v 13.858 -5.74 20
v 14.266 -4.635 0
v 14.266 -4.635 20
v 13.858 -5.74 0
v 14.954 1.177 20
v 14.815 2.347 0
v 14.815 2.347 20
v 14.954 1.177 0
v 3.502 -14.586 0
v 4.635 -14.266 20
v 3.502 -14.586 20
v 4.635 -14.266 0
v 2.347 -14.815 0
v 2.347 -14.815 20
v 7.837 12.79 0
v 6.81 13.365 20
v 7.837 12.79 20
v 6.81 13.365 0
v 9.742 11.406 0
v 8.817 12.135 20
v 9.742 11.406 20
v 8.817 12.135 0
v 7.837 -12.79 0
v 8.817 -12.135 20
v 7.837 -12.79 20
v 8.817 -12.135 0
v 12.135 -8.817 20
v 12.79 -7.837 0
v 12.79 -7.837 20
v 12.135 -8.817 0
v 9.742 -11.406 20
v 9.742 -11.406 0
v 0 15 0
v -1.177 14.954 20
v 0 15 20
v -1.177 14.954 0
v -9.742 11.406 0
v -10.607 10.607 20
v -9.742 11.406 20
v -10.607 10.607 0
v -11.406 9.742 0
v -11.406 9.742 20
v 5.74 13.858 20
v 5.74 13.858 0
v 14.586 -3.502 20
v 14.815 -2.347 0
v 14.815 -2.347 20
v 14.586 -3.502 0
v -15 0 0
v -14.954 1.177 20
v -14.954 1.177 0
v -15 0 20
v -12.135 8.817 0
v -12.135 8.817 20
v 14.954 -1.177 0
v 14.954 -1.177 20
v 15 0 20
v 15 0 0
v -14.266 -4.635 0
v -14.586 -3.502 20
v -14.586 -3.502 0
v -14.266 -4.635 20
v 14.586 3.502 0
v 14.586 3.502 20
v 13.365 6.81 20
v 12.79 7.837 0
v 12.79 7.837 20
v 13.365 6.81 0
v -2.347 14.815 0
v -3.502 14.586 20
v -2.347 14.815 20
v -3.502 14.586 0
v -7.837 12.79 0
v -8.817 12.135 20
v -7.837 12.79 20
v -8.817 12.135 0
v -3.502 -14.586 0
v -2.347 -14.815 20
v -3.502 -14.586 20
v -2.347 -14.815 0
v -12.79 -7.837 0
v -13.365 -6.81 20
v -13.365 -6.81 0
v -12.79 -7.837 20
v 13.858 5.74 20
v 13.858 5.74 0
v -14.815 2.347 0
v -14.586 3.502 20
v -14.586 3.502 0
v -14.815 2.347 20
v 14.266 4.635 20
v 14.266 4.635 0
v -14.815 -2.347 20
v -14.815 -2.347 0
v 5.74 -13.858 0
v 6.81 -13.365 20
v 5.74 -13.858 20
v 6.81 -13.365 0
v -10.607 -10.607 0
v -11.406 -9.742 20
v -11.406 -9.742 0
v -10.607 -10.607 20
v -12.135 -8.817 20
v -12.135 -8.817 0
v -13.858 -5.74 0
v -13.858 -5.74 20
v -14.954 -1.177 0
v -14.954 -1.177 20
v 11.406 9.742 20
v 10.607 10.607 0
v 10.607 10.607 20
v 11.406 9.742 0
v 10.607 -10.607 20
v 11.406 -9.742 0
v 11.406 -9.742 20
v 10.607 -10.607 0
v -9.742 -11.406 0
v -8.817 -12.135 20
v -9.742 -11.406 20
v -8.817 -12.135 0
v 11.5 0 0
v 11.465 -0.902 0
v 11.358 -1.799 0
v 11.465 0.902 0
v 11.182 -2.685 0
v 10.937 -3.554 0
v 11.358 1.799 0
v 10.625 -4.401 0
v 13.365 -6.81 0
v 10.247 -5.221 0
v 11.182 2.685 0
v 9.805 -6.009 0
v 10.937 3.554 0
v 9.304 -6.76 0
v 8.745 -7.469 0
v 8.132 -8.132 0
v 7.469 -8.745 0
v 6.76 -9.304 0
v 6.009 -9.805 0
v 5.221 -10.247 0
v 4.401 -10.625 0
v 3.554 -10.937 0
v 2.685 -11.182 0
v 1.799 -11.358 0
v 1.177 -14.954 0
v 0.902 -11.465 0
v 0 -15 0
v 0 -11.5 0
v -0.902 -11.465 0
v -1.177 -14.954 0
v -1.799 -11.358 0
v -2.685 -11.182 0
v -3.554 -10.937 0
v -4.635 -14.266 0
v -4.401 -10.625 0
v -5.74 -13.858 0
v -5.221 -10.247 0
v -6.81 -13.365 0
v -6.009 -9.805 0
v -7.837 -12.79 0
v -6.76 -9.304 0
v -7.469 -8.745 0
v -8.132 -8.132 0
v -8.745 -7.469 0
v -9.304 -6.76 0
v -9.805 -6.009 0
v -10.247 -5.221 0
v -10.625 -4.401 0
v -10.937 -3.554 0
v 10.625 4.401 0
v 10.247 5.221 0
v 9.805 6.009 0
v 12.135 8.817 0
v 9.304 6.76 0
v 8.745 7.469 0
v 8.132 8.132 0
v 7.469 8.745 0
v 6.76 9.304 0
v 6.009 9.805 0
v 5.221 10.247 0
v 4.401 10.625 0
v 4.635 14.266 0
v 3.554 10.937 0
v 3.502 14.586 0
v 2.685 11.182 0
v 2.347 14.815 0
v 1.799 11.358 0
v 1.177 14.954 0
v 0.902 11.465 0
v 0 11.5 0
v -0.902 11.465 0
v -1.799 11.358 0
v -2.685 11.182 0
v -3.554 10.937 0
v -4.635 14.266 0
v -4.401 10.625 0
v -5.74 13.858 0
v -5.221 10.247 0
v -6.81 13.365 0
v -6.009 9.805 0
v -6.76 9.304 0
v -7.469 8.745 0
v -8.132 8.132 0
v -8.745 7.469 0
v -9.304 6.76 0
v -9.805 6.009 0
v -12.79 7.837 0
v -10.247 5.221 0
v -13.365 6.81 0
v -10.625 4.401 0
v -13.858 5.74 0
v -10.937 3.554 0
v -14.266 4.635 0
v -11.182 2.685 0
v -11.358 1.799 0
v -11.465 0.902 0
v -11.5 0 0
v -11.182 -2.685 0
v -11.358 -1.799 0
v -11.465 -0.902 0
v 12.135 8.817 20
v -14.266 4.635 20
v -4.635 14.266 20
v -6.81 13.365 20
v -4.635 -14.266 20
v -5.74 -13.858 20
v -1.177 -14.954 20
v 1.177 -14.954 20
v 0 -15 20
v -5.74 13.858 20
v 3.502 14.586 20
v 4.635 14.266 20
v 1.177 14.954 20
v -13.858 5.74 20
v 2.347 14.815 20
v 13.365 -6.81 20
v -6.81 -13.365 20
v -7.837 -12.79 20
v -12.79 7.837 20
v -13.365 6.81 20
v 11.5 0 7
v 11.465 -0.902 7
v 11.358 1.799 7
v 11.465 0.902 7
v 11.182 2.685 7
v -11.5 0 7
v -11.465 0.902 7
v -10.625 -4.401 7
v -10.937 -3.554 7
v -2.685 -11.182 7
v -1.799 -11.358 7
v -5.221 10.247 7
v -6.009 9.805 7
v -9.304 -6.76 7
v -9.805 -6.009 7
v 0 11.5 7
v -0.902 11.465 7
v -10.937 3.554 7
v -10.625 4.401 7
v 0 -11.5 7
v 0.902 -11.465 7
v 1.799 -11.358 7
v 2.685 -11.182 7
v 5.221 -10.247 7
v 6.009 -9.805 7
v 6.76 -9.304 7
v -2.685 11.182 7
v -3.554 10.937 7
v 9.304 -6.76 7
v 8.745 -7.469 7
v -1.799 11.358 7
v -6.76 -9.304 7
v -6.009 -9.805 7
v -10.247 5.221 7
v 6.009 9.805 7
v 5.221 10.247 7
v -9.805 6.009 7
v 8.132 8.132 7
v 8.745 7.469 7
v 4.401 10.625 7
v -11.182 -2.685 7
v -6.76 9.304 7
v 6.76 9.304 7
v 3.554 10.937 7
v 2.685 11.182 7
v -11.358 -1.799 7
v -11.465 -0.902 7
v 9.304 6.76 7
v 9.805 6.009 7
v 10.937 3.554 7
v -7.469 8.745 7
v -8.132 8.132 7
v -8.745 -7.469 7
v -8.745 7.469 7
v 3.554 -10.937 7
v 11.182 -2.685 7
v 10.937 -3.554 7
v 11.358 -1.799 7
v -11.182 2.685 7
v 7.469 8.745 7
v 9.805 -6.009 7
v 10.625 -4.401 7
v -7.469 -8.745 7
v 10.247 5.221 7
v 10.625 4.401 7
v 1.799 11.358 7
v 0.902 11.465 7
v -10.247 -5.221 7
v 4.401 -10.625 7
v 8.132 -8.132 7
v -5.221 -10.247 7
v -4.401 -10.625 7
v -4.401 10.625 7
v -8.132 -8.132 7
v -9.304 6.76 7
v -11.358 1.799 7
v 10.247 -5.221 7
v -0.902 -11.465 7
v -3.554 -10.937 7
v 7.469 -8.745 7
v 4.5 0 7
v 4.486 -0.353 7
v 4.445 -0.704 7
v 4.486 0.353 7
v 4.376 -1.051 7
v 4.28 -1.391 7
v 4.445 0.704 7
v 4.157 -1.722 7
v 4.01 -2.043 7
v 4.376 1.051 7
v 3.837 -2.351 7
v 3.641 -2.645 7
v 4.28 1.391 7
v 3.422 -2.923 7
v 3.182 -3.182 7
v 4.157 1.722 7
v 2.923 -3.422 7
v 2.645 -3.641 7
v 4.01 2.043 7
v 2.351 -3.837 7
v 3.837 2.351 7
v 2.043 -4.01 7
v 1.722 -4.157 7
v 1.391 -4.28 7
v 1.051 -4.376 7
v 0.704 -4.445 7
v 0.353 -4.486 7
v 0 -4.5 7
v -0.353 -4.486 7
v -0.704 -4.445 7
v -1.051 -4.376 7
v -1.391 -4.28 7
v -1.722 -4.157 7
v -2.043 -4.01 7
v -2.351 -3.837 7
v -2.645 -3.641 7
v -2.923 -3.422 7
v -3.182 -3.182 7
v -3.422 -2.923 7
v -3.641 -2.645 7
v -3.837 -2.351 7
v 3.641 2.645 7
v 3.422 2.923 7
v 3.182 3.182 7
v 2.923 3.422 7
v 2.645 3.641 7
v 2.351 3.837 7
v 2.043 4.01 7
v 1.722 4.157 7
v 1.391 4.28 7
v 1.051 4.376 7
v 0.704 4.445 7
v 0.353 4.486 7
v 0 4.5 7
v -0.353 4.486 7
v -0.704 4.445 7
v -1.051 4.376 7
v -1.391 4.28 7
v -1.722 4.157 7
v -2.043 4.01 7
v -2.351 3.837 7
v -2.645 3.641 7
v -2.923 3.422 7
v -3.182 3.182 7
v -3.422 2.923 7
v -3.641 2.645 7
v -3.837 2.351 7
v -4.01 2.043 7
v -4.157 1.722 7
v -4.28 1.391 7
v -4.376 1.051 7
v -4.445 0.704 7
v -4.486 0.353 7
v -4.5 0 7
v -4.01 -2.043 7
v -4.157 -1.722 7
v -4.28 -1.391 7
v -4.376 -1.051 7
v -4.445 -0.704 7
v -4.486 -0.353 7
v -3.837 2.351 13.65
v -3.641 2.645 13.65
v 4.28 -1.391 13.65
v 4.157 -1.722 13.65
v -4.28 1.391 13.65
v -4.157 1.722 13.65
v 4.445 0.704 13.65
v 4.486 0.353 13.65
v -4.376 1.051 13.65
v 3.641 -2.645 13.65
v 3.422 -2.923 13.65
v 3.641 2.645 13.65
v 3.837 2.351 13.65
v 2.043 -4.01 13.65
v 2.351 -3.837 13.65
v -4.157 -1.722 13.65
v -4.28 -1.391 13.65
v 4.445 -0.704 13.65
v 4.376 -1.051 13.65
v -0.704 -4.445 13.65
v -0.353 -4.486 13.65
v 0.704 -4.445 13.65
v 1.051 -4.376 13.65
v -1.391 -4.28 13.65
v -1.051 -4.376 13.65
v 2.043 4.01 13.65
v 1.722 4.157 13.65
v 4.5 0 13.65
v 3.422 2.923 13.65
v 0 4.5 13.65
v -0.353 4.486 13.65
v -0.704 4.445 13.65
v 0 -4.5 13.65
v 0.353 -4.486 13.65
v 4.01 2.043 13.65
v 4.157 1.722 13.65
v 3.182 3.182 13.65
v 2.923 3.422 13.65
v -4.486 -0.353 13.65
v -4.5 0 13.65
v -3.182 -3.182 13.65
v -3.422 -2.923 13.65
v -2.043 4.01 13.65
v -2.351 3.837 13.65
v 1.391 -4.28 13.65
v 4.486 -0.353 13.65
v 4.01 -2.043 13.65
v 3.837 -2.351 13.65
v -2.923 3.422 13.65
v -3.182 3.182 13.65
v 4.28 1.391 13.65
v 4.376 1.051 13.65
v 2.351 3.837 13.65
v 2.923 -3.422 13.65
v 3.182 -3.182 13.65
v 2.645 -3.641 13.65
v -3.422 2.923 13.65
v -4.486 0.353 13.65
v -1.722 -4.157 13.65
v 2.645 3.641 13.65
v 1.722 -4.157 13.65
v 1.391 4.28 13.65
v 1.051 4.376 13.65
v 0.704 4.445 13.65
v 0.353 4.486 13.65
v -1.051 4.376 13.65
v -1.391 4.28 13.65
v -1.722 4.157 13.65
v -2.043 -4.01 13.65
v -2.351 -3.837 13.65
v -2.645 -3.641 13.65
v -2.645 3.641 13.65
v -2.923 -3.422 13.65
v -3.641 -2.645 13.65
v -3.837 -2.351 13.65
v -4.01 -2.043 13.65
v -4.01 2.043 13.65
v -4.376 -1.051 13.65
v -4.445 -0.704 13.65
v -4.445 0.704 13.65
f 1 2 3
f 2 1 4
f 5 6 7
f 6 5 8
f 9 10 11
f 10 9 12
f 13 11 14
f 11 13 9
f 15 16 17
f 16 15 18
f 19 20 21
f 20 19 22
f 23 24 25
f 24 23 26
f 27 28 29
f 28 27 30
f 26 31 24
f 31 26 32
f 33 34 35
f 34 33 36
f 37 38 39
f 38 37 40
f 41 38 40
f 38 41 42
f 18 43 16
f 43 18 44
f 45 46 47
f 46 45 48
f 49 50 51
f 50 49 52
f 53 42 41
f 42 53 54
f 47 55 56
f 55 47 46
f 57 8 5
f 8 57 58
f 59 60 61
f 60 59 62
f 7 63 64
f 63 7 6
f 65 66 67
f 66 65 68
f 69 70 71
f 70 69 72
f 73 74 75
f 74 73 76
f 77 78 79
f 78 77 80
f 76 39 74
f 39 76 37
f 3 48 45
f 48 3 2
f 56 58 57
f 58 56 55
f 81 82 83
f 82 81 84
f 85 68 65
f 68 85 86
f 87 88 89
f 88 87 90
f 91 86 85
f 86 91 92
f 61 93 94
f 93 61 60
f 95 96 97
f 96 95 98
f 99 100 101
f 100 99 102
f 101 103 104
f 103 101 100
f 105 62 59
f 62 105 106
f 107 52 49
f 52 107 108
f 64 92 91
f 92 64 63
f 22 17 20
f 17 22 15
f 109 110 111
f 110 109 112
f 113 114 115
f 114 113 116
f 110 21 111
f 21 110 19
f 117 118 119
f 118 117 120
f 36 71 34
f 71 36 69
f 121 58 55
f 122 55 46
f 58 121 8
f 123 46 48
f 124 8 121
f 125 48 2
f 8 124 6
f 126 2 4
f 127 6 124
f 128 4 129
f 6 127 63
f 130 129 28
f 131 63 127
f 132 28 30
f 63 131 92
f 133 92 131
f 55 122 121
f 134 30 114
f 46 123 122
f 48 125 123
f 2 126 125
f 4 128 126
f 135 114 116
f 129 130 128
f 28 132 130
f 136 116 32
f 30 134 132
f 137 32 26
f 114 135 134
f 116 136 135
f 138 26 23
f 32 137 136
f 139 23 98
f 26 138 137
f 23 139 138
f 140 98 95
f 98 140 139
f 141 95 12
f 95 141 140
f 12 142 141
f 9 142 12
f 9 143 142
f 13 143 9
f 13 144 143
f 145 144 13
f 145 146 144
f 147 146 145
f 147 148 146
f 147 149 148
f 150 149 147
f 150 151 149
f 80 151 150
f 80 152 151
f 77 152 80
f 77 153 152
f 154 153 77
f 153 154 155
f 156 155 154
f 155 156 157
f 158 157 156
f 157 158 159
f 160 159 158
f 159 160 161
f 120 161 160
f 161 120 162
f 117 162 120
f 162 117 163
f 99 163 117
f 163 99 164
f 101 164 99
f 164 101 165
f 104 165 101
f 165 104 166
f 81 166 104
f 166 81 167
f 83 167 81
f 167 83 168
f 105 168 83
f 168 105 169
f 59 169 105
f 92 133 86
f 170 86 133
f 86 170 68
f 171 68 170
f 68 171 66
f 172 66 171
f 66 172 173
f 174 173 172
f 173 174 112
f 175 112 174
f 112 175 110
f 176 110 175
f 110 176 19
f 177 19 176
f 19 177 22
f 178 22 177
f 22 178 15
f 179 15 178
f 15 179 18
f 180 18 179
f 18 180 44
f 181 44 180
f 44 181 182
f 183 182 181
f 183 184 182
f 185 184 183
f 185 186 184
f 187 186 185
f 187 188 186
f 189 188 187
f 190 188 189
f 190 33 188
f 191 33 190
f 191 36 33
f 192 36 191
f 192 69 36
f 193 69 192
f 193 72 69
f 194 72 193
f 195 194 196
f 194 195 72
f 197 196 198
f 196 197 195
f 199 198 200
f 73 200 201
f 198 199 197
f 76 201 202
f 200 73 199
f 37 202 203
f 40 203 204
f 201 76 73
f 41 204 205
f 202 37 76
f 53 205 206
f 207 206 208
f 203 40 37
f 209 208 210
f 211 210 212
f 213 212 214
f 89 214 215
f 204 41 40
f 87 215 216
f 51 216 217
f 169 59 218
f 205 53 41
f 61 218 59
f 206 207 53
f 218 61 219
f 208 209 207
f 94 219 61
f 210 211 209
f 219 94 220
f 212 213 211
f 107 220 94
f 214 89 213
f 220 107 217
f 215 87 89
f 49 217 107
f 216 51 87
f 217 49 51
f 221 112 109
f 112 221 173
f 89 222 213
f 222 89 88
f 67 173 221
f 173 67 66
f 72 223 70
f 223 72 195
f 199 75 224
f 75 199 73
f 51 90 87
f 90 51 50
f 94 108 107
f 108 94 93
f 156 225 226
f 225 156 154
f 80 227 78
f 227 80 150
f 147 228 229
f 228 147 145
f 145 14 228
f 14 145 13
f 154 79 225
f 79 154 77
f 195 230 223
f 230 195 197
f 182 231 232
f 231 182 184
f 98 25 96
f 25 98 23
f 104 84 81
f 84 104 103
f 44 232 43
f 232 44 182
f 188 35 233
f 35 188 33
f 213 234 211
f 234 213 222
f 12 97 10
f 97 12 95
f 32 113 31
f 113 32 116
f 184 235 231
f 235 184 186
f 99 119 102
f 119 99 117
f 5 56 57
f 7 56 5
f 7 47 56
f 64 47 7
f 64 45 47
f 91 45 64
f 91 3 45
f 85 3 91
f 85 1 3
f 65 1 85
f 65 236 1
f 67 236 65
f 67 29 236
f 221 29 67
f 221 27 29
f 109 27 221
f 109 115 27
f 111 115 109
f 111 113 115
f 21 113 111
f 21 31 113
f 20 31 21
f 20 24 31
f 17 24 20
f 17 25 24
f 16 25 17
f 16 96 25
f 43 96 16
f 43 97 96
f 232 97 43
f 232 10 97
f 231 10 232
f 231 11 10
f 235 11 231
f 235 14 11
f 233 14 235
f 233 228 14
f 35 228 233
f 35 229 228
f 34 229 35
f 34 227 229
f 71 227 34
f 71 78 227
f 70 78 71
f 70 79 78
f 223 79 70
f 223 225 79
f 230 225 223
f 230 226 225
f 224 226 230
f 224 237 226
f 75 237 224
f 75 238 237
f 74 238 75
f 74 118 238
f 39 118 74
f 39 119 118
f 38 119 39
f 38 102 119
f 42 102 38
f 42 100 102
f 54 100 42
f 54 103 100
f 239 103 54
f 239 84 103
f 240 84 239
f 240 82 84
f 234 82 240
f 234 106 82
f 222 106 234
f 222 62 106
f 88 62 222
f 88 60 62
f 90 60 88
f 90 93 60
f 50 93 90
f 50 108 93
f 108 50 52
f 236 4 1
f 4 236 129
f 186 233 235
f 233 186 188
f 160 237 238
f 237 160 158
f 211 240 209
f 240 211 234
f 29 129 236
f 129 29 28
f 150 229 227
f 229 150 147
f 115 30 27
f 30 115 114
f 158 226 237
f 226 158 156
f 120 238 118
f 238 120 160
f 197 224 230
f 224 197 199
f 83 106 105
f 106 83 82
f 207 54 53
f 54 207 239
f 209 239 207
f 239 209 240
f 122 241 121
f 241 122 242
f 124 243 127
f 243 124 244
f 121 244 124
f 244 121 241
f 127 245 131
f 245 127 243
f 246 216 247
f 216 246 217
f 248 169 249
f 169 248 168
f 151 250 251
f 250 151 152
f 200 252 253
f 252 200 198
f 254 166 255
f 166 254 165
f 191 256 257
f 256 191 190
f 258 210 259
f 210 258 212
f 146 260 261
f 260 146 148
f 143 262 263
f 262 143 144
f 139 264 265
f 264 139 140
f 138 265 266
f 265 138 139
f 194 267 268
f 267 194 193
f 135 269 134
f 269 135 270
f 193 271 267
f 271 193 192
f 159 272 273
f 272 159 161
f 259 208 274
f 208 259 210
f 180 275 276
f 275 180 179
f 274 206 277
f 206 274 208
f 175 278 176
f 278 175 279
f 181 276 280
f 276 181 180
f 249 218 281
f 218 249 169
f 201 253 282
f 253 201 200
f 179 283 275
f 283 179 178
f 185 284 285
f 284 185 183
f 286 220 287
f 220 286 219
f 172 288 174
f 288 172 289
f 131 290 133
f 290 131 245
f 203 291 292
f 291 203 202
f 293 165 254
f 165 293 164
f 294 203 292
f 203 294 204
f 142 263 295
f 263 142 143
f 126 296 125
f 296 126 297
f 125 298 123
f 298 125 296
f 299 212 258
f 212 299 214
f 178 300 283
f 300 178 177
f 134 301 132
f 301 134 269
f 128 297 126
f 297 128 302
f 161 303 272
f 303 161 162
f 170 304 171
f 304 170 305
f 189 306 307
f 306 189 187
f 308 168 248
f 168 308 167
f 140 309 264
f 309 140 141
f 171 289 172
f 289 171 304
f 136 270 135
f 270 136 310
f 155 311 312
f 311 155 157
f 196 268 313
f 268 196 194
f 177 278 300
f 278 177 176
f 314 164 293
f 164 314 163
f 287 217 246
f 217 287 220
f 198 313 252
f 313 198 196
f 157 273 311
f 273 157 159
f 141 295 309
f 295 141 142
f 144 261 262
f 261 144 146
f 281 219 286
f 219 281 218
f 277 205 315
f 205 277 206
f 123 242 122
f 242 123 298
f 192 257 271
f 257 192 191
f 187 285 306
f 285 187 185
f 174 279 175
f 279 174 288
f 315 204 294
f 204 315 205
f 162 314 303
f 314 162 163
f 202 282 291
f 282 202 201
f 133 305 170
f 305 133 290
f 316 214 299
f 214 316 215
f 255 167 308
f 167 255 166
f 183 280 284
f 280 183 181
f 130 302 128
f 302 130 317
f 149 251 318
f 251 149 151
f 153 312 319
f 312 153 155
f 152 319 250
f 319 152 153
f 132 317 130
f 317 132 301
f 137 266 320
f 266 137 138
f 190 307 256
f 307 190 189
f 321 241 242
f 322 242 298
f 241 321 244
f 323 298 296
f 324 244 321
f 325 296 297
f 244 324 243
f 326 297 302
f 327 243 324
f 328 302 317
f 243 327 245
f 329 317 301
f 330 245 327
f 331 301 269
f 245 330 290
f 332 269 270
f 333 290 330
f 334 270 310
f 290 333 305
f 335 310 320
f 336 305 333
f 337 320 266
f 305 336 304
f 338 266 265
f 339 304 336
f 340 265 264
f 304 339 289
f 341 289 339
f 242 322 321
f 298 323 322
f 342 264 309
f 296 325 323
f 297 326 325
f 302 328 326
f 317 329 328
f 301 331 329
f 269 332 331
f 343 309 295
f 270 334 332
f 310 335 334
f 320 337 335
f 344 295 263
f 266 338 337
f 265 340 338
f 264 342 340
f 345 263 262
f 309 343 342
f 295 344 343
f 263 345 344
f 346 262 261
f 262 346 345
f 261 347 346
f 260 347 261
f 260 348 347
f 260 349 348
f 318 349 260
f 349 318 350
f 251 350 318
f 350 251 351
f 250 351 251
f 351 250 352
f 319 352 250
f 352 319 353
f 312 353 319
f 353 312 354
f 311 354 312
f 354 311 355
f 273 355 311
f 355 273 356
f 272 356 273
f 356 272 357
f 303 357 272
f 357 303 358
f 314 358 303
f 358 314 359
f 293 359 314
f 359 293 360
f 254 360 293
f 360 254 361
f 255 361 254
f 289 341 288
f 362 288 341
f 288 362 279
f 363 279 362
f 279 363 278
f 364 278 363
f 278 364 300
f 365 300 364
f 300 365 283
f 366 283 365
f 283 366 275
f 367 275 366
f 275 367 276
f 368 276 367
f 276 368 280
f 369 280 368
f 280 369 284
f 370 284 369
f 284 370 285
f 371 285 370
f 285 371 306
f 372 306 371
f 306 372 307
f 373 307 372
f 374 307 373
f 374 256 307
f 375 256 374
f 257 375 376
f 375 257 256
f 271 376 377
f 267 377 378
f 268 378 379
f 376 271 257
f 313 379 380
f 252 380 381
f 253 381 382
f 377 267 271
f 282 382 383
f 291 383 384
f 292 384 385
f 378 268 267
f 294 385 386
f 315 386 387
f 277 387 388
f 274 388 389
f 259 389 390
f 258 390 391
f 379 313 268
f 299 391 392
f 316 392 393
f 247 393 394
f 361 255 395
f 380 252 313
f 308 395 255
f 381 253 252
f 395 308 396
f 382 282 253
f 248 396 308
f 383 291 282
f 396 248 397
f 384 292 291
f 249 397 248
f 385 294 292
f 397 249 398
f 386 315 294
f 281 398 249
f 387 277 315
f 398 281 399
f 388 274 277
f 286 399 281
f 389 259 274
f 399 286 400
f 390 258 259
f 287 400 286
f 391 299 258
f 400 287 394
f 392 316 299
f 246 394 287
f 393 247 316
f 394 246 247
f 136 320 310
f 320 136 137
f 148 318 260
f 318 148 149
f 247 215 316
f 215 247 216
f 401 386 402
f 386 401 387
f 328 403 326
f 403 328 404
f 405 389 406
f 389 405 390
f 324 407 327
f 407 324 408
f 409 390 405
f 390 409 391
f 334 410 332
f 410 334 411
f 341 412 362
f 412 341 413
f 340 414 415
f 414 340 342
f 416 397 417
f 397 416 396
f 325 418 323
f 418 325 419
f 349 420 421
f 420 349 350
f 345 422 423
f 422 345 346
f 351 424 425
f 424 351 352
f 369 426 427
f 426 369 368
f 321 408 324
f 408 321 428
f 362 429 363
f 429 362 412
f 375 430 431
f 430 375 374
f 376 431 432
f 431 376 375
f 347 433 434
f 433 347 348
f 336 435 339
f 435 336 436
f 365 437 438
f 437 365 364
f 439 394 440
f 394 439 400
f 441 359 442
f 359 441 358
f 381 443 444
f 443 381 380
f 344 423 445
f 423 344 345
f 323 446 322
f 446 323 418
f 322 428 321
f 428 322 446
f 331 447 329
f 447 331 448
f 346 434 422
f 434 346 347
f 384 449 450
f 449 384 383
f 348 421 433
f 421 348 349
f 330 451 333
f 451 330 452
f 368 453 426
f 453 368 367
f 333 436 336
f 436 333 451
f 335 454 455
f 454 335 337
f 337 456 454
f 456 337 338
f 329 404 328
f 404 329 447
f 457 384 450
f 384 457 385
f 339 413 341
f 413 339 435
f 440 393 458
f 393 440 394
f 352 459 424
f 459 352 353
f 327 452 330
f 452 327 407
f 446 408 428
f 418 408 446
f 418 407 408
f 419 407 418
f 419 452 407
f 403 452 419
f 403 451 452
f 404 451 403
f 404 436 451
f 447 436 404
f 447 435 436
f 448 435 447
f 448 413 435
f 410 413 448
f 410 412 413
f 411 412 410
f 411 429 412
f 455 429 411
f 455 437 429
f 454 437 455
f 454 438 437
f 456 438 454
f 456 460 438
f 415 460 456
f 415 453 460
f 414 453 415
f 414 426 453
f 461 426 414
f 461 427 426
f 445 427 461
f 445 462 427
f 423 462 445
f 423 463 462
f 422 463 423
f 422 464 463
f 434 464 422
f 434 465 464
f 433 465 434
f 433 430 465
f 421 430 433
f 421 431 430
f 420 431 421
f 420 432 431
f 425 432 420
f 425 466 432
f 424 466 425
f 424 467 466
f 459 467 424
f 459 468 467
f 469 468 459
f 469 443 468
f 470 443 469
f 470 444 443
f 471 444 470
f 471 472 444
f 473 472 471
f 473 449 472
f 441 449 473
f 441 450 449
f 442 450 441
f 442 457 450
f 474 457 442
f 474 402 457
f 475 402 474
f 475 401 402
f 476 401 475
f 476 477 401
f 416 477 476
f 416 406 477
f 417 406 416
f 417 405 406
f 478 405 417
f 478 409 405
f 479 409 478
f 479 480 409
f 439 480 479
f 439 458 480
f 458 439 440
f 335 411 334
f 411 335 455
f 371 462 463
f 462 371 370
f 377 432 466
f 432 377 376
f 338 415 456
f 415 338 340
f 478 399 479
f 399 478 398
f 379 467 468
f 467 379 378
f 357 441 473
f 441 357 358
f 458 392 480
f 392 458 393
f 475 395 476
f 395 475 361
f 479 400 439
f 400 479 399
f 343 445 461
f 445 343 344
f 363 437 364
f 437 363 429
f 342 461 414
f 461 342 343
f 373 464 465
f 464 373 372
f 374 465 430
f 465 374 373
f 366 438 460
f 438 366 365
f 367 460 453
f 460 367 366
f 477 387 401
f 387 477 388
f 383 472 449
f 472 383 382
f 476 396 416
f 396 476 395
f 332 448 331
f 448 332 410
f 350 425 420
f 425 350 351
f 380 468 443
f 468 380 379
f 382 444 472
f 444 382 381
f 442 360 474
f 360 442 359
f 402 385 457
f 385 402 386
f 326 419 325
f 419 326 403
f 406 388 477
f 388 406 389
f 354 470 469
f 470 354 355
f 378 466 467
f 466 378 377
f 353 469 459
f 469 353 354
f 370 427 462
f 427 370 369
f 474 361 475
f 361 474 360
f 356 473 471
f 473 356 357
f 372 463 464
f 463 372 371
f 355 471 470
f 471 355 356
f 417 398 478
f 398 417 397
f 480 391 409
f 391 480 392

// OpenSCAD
$fn = 80;

difference(){
    cylinder(20, r = 15);
    cylinder(7, r = 11.5);
    cylinder(20-25.4/4, r = 4.5);
}
